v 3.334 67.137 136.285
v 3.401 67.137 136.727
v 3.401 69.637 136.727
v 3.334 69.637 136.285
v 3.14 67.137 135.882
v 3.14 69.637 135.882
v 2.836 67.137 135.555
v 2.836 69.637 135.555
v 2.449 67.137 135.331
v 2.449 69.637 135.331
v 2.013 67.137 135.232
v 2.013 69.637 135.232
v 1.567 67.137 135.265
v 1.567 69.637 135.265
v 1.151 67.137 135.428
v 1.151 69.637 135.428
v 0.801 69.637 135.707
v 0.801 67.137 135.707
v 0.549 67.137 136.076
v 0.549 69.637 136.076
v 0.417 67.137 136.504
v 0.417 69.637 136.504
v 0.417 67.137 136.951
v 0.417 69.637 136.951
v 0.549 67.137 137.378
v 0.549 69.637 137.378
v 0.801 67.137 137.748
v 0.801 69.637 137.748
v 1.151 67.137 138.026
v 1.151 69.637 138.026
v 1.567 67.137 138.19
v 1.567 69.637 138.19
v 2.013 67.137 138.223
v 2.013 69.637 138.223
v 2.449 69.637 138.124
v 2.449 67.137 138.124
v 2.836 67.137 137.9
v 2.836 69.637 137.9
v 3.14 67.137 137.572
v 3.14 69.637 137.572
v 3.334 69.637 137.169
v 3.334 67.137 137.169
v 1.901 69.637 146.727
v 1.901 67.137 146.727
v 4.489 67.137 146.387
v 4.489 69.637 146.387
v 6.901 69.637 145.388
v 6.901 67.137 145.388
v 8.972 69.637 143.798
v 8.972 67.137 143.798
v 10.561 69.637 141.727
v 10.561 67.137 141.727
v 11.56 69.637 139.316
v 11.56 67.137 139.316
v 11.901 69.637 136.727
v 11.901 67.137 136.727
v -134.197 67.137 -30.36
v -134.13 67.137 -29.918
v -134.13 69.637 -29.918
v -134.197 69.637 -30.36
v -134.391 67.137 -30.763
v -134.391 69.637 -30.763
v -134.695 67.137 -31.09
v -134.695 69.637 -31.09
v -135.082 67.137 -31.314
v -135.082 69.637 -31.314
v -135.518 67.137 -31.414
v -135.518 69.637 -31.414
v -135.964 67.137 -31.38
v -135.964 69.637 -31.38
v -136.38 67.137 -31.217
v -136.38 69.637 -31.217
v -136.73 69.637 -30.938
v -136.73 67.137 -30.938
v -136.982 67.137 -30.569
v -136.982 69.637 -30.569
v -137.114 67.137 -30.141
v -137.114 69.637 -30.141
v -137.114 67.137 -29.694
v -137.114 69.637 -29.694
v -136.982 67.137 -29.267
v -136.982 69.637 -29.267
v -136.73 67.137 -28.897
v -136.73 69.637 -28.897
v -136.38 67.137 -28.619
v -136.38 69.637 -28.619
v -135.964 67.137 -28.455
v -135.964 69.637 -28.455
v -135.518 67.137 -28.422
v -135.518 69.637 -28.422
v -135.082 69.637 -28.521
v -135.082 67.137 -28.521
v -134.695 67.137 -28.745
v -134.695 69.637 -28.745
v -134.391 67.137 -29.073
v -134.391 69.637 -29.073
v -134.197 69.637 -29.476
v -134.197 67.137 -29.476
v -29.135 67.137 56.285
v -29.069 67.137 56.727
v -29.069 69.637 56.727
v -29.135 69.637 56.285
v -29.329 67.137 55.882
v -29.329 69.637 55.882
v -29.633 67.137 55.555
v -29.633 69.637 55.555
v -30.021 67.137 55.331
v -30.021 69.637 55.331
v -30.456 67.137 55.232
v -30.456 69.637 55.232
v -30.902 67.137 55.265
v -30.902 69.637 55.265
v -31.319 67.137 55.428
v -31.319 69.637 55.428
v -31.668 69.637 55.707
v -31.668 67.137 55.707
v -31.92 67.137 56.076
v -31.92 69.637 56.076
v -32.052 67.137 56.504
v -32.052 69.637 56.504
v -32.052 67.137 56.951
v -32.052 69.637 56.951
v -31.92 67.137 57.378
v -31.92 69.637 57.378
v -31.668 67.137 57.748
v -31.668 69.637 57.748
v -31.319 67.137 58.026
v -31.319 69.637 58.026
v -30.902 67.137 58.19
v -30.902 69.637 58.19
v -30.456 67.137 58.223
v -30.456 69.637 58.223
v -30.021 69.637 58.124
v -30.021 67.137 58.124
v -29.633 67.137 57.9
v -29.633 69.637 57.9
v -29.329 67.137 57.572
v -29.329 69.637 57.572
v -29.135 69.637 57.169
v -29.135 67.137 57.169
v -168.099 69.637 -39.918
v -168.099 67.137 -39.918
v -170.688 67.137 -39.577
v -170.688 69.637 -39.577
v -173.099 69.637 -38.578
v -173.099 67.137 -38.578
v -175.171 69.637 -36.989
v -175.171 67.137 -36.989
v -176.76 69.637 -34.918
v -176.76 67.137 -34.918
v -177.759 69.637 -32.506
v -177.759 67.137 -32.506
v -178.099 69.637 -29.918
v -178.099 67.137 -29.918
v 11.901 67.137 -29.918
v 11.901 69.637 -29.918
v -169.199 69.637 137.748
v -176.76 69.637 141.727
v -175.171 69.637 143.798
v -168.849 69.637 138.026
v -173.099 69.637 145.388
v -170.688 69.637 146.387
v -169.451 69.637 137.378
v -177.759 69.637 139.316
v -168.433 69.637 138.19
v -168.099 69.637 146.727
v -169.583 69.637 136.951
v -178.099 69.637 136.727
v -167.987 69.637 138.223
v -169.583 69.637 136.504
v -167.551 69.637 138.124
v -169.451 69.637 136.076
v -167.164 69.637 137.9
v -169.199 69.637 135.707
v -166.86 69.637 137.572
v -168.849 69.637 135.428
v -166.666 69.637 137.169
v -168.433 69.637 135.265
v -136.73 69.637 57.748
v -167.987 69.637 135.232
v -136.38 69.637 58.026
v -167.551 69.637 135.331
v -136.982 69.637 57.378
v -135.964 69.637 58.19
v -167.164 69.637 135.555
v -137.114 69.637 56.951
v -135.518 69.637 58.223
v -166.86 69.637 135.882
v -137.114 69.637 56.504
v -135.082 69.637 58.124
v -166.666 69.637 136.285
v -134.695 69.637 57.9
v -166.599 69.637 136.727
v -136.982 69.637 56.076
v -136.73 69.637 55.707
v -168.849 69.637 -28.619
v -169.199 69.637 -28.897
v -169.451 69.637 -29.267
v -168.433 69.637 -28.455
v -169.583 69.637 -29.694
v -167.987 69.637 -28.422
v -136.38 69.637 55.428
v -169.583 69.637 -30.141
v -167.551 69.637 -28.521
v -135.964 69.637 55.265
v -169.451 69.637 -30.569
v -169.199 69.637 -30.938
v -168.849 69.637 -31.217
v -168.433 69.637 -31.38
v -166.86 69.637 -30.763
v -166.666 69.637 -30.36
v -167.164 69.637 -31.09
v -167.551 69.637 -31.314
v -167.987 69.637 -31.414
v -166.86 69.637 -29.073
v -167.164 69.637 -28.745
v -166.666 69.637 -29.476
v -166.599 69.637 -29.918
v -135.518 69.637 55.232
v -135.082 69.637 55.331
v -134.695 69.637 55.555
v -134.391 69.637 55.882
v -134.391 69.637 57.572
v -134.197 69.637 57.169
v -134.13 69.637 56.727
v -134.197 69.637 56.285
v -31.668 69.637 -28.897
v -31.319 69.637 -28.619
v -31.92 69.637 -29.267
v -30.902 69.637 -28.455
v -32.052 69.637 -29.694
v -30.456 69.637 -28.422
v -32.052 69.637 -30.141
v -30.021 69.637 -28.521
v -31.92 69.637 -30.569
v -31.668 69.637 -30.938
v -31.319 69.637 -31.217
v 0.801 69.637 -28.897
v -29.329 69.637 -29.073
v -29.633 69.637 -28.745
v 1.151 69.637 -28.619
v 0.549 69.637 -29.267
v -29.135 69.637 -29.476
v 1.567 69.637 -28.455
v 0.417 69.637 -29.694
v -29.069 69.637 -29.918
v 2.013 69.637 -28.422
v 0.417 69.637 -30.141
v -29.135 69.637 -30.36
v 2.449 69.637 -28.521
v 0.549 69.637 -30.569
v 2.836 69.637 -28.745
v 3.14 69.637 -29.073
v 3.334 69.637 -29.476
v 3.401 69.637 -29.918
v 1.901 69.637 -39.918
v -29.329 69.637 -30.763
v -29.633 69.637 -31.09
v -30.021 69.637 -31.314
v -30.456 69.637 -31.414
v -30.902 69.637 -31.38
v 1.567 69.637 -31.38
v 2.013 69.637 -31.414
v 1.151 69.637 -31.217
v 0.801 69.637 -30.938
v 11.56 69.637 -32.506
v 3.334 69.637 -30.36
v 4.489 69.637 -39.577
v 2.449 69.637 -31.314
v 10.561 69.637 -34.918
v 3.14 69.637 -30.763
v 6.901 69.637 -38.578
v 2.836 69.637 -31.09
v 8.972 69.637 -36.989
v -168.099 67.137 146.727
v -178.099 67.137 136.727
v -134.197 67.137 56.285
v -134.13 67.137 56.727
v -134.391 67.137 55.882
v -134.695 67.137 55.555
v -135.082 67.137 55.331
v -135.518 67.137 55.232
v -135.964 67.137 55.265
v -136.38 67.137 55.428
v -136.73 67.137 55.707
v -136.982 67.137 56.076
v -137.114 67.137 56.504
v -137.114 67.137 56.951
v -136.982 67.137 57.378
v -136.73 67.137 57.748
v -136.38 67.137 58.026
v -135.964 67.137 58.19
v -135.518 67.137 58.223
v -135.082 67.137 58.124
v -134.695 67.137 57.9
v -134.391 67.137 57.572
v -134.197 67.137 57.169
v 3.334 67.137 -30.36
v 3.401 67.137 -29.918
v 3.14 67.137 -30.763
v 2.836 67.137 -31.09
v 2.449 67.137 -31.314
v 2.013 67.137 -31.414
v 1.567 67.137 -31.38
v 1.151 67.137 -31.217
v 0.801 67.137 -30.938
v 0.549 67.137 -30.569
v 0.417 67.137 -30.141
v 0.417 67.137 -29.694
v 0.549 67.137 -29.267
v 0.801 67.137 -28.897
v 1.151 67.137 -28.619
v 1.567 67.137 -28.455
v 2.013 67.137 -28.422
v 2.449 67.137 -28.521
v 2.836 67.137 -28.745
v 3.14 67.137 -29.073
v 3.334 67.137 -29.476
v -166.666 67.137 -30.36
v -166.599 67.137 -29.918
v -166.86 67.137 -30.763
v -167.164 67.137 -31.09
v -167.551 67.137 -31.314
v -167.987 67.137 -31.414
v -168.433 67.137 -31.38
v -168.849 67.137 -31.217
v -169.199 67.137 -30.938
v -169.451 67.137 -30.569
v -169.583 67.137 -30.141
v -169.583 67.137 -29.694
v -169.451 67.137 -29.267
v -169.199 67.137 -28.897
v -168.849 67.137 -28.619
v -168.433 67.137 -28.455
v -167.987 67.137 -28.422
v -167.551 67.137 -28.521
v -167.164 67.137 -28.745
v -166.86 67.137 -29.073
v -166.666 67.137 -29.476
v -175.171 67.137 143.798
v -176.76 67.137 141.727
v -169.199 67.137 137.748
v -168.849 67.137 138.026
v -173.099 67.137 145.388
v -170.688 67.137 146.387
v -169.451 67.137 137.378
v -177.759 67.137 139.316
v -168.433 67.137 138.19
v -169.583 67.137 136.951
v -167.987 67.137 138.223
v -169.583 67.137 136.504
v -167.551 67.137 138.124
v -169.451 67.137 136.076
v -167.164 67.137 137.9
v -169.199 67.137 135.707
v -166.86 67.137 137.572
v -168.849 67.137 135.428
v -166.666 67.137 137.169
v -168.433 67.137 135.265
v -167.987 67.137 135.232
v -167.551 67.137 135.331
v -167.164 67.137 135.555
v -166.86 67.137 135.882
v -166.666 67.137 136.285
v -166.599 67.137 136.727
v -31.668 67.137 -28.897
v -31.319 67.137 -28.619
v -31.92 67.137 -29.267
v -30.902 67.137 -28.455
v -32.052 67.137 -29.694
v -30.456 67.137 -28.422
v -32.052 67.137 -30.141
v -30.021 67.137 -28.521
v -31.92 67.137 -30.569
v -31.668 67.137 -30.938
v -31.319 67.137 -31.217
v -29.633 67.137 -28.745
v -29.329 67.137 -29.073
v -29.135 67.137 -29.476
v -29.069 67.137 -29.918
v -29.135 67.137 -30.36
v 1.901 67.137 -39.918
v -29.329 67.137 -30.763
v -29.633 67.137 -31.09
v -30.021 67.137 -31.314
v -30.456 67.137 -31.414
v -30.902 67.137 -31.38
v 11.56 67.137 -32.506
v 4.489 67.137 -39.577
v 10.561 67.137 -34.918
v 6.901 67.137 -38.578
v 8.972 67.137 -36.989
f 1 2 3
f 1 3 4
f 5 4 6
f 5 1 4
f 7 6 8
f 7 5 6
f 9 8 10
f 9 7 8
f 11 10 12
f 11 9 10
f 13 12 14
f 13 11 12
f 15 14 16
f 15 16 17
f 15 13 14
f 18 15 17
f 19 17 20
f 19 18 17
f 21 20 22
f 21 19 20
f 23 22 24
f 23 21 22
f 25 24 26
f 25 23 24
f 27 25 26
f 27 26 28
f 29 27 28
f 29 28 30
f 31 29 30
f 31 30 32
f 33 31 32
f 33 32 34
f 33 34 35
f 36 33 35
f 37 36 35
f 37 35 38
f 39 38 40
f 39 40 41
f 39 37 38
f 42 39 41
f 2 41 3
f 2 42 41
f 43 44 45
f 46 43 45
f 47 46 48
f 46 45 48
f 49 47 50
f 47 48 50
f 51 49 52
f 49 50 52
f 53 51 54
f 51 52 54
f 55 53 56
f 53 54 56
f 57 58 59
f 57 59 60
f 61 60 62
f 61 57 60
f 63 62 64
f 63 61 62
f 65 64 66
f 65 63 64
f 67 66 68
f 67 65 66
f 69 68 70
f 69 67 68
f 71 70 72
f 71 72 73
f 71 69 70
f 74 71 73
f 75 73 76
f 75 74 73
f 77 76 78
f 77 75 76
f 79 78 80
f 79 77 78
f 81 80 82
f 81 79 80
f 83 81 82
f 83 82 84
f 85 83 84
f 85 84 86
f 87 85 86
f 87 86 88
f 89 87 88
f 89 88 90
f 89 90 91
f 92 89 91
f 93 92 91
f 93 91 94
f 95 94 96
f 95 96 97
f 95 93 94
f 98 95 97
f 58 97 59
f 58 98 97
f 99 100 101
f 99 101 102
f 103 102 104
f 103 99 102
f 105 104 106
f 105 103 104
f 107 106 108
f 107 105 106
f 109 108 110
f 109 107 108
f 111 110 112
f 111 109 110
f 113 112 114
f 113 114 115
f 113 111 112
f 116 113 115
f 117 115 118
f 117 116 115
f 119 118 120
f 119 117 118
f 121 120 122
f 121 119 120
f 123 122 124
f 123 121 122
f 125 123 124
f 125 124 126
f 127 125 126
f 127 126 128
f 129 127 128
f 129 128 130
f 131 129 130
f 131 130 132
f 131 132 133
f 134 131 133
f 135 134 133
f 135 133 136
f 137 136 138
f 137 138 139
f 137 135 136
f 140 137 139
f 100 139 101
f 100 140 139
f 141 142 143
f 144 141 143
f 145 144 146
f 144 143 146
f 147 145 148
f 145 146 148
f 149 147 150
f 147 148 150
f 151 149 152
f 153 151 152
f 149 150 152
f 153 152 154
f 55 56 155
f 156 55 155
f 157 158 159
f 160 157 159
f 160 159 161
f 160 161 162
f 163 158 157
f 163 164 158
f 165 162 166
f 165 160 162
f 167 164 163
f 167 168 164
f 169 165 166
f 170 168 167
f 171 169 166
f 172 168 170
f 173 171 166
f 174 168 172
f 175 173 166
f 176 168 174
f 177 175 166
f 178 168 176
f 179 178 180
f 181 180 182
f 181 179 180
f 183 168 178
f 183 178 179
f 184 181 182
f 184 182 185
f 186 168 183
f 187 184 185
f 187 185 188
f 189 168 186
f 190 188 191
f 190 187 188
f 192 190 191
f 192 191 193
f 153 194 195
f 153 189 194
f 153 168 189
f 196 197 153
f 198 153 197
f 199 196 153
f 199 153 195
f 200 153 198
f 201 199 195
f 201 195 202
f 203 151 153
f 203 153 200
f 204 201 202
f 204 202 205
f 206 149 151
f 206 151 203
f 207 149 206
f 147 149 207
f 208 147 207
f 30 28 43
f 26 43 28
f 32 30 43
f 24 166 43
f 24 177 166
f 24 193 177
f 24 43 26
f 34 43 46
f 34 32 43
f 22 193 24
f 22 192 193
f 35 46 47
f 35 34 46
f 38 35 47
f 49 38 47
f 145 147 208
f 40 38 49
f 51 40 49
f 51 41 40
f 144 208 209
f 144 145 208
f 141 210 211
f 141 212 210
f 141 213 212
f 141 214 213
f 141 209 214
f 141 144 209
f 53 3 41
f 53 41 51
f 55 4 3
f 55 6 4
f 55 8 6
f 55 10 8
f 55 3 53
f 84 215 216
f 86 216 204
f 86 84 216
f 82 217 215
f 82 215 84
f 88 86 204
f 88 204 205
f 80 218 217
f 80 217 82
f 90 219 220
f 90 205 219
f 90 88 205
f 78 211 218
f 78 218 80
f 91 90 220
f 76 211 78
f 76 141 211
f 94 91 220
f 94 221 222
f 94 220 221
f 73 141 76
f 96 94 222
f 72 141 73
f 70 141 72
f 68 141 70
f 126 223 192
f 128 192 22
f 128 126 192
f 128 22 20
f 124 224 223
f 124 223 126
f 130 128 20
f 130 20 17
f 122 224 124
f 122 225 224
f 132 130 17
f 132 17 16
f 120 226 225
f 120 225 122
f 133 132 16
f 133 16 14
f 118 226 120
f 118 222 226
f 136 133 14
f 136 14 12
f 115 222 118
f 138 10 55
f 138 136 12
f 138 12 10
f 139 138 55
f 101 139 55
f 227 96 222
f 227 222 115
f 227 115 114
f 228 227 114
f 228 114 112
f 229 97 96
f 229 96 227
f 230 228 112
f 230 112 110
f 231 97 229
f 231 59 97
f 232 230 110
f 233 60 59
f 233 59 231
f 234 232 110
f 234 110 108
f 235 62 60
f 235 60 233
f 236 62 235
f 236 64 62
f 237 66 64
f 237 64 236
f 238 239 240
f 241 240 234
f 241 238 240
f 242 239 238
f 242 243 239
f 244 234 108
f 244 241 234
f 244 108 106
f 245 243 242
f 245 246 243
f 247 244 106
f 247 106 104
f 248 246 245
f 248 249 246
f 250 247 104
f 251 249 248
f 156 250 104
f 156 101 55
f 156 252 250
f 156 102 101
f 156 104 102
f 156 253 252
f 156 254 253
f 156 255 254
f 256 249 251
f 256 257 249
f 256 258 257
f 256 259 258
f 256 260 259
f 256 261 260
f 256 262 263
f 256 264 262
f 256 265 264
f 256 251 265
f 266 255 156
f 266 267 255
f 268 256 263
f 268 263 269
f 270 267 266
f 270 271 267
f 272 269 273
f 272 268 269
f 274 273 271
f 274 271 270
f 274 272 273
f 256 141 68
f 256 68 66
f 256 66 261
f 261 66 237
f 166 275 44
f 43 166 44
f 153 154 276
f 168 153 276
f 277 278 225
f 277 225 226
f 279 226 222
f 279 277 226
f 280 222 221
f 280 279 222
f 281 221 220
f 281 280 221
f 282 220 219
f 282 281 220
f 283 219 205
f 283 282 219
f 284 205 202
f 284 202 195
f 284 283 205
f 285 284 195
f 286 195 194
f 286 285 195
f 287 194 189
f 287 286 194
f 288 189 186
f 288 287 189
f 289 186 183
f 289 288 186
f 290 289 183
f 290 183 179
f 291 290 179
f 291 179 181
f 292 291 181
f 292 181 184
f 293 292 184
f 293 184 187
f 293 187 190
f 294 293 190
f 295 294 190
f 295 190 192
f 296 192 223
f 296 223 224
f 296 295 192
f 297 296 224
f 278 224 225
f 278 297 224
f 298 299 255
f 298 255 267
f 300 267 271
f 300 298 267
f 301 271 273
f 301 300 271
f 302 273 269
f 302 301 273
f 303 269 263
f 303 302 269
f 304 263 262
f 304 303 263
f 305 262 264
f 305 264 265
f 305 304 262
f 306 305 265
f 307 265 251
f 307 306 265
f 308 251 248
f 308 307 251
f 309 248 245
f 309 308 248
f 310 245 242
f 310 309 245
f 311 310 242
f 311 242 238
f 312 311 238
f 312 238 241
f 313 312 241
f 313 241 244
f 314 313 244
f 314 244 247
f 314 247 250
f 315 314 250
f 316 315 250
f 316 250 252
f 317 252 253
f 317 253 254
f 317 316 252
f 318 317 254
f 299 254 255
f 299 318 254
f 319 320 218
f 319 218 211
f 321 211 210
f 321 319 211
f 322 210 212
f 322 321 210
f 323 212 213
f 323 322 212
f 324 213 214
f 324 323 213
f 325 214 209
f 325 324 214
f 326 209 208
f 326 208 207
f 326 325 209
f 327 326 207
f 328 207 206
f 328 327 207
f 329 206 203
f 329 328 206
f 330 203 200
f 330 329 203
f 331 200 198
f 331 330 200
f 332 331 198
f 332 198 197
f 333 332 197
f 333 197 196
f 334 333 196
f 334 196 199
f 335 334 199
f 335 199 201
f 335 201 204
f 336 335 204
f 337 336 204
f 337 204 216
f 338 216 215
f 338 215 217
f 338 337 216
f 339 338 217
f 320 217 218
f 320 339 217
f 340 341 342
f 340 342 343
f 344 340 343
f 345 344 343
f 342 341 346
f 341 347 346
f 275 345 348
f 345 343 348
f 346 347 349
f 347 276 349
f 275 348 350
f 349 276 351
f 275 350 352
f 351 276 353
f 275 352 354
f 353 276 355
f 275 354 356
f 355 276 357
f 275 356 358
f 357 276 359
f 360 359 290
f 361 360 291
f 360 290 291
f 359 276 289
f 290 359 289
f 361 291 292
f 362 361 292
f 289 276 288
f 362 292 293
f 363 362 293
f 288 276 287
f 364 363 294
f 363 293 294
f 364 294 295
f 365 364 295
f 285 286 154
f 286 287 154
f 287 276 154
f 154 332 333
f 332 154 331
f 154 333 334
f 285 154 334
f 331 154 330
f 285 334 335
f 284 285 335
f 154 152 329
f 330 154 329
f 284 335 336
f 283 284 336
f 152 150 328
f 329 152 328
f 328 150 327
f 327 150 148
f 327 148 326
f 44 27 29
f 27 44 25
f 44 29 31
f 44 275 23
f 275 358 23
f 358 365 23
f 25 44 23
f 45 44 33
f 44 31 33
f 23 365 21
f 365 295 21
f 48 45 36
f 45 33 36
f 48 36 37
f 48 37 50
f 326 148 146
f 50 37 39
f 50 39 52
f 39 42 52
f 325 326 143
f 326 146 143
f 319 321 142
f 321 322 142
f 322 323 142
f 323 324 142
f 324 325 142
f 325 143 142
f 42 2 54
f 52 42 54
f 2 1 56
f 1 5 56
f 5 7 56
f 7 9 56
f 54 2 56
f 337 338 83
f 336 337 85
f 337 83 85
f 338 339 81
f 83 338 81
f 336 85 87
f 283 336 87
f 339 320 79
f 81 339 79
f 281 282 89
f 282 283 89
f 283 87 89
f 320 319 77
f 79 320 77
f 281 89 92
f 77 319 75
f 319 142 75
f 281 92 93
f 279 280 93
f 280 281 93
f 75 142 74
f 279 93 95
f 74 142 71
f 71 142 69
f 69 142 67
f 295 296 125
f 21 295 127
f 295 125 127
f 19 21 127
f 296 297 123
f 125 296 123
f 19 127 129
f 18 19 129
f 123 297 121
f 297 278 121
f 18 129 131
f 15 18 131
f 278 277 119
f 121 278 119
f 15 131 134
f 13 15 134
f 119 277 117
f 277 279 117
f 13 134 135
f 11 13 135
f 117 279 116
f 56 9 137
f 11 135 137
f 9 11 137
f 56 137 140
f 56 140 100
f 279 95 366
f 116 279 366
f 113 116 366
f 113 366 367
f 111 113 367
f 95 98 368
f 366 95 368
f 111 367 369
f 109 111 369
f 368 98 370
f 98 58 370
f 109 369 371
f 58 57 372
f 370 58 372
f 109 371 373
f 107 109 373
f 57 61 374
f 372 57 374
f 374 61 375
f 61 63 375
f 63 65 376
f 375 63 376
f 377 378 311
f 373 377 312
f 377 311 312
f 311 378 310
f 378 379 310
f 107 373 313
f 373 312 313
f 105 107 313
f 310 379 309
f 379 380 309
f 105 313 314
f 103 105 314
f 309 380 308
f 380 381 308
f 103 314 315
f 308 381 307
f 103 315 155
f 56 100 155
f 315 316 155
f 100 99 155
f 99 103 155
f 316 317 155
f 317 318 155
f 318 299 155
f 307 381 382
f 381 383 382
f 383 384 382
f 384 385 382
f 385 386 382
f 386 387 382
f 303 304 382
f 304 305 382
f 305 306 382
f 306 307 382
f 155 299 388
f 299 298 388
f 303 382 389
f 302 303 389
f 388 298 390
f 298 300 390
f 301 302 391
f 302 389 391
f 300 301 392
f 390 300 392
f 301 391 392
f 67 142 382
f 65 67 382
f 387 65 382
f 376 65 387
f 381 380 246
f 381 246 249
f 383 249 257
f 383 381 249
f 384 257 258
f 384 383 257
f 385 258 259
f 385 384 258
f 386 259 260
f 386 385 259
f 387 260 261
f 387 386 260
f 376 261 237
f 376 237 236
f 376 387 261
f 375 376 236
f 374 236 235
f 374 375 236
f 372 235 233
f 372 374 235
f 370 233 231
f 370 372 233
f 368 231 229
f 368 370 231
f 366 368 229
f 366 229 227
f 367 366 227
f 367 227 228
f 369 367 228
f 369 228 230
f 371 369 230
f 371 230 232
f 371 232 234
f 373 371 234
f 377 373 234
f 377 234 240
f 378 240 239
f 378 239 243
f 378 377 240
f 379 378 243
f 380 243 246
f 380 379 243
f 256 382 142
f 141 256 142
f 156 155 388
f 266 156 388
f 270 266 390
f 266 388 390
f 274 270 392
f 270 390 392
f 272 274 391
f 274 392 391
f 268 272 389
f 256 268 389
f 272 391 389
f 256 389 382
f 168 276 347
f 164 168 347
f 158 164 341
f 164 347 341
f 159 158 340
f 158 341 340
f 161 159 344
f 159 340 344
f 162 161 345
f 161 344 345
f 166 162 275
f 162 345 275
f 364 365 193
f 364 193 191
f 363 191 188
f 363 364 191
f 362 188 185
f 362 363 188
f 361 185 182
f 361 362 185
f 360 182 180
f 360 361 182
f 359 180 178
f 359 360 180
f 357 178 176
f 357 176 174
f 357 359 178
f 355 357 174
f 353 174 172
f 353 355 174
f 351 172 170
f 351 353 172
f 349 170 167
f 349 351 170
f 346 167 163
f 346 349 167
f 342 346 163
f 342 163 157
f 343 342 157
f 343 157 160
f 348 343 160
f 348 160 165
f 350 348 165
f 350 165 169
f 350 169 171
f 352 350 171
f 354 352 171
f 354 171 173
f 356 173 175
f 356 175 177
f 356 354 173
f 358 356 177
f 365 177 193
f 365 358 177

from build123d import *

# Parameters (mm, degrees)
SKETCH_1_R      = 1.5
EXTRUDE_1_DEPTH = 2.5


with BuildPart() as part:
    # 草图1 → 凸台-拉伸1 (new body)
    with BuildSketch(Plane(origin=(0, 67.13711373, 0), x_dir=(1, 0, 0), z_dir=(0, 1, 0))):
        with BuildLine():
            Line((1.900520775, 39.917702002), (-168.099479225, 39.917702002))
            ThreePointArc((-168.099479225, 39.917702002), (-175.170547037, 36.988769814), (-178.099479225, 29.917702002))
            Line((-178.099479225, 29.917702002), (-178.099479225, -136.727321584))
            ThreePointArc((-178.099479225, -136.727321584), (-175.170547037, -143.798389396), (-168.099479225, -146.727321584))
            Line((-168.099479225, -146.727321584), (1.900520775, -146.727321584))
            ThreePointArc((1.900520775, -146.727321584), (8.971588587, -143.798389396), (11.900520775, -136.727321584))
            Line((11.900520775, -136.727321584), (11.900520775, 29.917702002))
            ThreePointArc((11.900520775, 29.917702002), (8.971588587, 36.988769814), (1.900520775, 39.917702002))
        make_face()
        with Locations((-30.568515715, 29.917702002)):
            Circle(SKETCH_1_R, mode=Mode.SUBTRACT)
        with Locations((-135.630442735, 29.917702002)):
            Circle(SKETCH_1_R, mode=Mode.SUBTRACT)
        with Locations((-135.630442735, -56.727321584)):
            Circle(SKETCH_1_R, mode=Mode.SUBTRACT)
        with Locations((-30.568515715, -56.727321584)):
            Circle(SKETCH_1_R, mode=Mode.SUBTRACT)
        with Locations((1.900520775, 29.917702002)):
            Circle(SKETCH_1_R, mode=Mode.SUBTRACT)
        with Locations((1.900520775, -136.727321584)):
            Circle(SKETCH_1_R, mode=Mode.SUBTRACT)
        with Locations((-168.099479225, -136.727321584)):
            Circle(SKETCH_1_R, mode=Mode.SUBTRACT)
        with Locations((-168.099479225, 29.917702002)):
            Circle(SKETCH_1_R, mode=Mode.SUBTRACT)
    extrude(amount=EXTRUDE_1_DEPTH)


solid = part.part
